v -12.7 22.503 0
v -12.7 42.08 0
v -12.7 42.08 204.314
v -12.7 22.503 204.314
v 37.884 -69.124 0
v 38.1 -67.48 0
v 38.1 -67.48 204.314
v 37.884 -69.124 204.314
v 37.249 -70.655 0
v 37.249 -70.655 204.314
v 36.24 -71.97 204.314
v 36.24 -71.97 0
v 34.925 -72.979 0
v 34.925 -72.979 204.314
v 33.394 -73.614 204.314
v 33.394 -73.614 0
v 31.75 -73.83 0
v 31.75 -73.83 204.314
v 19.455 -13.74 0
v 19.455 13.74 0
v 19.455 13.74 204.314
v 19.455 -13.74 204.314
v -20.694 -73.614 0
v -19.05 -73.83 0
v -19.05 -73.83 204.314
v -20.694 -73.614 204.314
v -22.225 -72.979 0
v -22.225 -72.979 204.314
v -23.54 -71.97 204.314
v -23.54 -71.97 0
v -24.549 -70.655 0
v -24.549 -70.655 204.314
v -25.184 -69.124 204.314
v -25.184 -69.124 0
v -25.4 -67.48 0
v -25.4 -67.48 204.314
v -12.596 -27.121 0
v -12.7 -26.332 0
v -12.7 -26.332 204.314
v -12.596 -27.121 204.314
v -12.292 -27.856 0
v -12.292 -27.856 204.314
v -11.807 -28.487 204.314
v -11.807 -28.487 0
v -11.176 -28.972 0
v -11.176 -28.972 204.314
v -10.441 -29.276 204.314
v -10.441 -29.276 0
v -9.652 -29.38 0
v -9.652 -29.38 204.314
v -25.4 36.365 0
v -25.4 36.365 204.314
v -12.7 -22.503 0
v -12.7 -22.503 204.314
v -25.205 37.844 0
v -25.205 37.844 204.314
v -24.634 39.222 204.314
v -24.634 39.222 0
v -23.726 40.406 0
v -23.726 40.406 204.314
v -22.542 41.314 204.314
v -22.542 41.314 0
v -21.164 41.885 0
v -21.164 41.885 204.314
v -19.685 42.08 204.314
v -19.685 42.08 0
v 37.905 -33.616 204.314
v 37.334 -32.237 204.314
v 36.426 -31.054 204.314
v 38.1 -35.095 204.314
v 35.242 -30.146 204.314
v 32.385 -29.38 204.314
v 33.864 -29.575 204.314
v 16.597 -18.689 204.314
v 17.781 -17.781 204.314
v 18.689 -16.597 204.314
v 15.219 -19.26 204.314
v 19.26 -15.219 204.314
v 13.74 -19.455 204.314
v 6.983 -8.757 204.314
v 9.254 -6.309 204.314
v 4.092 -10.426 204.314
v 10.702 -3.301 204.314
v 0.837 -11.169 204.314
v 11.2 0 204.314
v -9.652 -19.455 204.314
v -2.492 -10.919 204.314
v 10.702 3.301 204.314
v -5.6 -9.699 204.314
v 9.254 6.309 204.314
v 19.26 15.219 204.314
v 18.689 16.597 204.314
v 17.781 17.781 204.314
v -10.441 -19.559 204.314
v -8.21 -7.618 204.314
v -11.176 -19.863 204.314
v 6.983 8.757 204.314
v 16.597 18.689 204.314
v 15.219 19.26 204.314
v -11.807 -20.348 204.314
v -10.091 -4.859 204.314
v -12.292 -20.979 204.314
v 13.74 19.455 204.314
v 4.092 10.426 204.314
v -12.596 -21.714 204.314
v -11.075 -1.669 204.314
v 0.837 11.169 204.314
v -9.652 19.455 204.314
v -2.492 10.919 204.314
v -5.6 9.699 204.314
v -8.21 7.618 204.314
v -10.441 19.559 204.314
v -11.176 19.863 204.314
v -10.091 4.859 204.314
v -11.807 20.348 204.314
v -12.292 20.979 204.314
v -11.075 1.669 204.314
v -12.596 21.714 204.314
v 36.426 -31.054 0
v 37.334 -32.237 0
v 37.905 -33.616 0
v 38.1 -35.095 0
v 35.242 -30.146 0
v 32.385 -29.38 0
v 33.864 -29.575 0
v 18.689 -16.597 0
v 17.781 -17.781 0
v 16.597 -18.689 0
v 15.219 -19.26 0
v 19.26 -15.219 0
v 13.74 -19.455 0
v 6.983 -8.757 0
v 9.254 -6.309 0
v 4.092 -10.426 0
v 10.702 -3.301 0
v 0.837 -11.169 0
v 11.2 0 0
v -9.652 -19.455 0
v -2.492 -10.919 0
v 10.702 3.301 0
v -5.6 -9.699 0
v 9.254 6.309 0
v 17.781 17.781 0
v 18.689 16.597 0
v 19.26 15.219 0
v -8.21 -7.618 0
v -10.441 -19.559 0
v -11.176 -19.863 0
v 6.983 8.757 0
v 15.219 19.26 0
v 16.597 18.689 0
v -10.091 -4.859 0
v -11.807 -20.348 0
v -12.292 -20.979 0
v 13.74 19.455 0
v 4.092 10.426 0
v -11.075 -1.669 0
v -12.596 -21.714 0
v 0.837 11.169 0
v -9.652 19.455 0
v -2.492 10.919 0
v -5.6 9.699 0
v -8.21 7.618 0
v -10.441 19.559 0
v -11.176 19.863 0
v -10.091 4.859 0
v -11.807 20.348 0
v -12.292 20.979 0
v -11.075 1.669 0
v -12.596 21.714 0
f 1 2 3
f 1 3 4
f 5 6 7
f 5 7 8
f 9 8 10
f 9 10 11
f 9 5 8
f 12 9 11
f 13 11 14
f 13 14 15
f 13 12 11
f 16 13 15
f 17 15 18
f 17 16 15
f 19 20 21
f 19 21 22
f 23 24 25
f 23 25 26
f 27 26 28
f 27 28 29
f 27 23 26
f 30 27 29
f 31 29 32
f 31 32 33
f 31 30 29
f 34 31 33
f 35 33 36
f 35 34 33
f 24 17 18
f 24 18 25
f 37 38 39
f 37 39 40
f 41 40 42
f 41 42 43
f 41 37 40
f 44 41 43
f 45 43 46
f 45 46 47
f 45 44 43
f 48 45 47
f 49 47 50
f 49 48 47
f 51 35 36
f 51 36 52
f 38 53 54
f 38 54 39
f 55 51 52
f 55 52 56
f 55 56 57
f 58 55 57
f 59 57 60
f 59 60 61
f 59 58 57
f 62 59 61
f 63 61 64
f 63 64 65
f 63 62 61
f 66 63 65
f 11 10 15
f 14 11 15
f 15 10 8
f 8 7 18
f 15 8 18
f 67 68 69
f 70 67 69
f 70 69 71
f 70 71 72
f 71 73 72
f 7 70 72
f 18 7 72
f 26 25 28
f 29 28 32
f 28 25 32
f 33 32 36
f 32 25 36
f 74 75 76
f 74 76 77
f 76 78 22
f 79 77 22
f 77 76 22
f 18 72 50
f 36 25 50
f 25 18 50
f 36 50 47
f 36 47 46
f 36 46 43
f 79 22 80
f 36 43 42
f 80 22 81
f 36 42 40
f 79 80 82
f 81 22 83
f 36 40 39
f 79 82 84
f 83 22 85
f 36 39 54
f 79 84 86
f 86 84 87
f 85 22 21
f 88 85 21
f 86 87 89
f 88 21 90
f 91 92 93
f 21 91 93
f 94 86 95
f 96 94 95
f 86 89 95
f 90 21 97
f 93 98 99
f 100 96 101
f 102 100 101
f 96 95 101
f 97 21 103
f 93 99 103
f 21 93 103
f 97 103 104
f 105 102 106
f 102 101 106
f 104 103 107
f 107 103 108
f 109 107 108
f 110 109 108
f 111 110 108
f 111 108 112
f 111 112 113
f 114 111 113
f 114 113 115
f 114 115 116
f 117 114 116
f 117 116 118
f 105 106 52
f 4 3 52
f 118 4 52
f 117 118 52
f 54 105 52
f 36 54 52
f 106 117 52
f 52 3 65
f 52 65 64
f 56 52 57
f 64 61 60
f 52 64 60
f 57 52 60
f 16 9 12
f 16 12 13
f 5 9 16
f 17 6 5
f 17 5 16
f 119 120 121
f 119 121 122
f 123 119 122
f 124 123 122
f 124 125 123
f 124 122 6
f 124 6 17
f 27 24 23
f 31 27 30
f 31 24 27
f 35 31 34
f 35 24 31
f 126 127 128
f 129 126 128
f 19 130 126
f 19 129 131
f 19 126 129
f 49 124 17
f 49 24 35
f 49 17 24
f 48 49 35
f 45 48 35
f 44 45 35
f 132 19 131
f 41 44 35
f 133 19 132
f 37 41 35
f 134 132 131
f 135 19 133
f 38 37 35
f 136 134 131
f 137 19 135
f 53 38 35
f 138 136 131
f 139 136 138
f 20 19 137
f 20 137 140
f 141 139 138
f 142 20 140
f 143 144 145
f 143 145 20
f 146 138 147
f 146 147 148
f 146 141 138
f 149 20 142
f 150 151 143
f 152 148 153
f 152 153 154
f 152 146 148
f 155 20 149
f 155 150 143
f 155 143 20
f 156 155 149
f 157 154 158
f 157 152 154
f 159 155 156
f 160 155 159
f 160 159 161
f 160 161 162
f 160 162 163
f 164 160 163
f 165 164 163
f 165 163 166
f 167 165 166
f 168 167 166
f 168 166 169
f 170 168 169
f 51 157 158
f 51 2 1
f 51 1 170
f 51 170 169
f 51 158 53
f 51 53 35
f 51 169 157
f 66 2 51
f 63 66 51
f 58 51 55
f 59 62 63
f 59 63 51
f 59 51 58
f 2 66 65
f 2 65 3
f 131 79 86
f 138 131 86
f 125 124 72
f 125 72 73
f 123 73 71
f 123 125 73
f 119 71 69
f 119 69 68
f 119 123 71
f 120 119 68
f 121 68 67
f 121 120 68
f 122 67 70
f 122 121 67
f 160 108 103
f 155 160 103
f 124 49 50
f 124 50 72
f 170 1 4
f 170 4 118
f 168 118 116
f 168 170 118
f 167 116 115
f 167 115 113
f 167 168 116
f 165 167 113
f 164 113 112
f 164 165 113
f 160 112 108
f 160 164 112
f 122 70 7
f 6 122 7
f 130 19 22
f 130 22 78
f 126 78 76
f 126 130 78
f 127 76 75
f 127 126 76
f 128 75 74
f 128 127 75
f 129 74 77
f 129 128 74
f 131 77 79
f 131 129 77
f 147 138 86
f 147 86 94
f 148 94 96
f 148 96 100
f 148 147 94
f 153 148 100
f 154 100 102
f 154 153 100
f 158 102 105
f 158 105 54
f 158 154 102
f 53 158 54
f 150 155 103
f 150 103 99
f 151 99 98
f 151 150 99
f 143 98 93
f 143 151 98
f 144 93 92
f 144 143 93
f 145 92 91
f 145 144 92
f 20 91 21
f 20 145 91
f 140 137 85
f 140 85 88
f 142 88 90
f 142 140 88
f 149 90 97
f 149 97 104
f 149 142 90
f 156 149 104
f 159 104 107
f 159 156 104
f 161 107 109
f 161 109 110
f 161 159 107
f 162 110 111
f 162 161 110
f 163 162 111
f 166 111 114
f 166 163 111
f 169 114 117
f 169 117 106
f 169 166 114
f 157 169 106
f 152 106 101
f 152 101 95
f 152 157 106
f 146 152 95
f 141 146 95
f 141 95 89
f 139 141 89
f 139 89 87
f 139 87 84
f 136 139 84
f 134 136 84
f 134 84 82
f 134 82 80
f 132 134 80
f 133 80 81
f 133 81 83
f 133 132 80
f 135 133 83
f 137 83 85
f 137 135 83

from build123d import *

# Parameters (mm, degrees)
SKETCH1_R           = 11.2
BOSS_EXTRUDE1_DEPTH = 204.313708212
CUT_EXTRUDE1_DEPTH  = 236.982


with BuildPart() as part:
    # Sketch1 → Boss-Extrude1 (new body)
    with BuildSketch(Plane.XY):
        with BuildLine():
            Line((-25.4, -67.479999962), (-25.4, 36.365))
            ThreePointArc((-25.4, 36.365), (-23.726115254, 40.406115254), (-19.685, 42.08))
            Line((-19.685, 42.08), (32.385, 42.08))
            ThreePointArc((32.385, 42.08), (36.426115254, 40.406115254), (38.1, 36.365))
            Line((38.1, 36.365), (38.1, 35.095))
            ThreePointArc((38.1, 35.095), (36.426115254, 31.053884746), (32.385, 29.38))
            Line((32.385, 29.38), (-9.652, 29.38))
            ThreePointArc((-9.652, 29.38), (-11.807261469, 28.487261469), (-12.7, 26.332))
            Line((-12.7, 26.332), (-12.7, 22.503))
            ThreePointArc((-12.7, 22.503), (-11.807261469, 20.347738531), (-9.652, 19.455))
            Line((-9.652, 19.455), (0, 19.455))
            Line((0, 19.455), (13.74, 19.455))
            ThreePointArc((13.74, 19.455), (17.781115254, 17.781115254), (19.455, 13.74))
            Line((19.455, 13.74), (19.455, 0))
            Line((19.455, 0), (19.455, -13.74))
            ThreePointArc((19.455, -13.74), (17.781115254, -17.781115254), (13.74, -19.455))
            Line((13.74, -19.455), (0, -19.455))
            Line((0, -19.455), (-9.652, -19.455))
            ThreePointArc((-9.652, -19.455), (-11.807261469, -20.347738531), (-12.7, -22.503))
            Line((-12.7, -22.503), (-12.7, -26.331999962))
            ThreePointArc((-12.7, -26.331999962), (-11.807261469, -28.487261431), (-9.652, -29.379999962))
            Line((-9.652, -29.379999962), (32.385, -29.379999962))
            ThreePointArc((32.385, -29.379999962), (36.426115254, -31.053884708), (38.1, -35.094999962))
            Line((38.1, -35.094999962), (38.1, -67.479999962))
            ThreePointArc((38.1, -67.479999962), (36.240128061, -71.970128023), (31.75, -73.829999962))
            Line((31.75, -73.829999962), (-19.05, -73.829999962))
            ThreePointArc((-19.05, -73.829999962), (-23.540128061, -71.970128023), (-25.4, -67.479999962))
        make_face()
        Circle(SKETCH1_R, mode=Mode.SUBTRACT)
    extrude(amount=BOSS_EXTRUDE1_DEPTH)

    # Sketch2 → Cut-Extrude1 (cut)
    with BuildSketch(Plane.XY.offset(204.313708212)):
        with BuildLine():
            ThreePointArc((32.385, 29.38), (36.426115254, 31.053884746), (38.1, 35.095))
            Line((38.1, 35.095), (38.1, 36.365))
            ThreePointArc((38.1, 36.365), (36.426115254, 40.406115254), (32.385, 42.08))
            Line((32.385, 42.08), (19.455, 42.08))
            Line((19.455, 42.08), (19.455, 29.38))
            Line((19.455, 29.38), (32.385, 29.38))
        make_face()
        with BuildLine():
            Line((-9.652, 29.38), (19.455, 29.38))
            Line((19.455, 29.38), (19.455, 42.08))
            Line((19.455, 42.08), (-12.7, 42.08))
            Line((-12.7, 42.08), (-12.7, 26.332))
            ThreePointArc((-12.7, 26.332), (-11.807261469, 28.487261469), (-9.652, 29.38))
        make_face()
        with BuildLine():
            Line((19.455, 13.74), (19.455, -13.74))
            Line((19.455, -13.74), (38.1, -13.74))
            Line((38.1, -13.74), (38.1, 35.095))
            ThreePointArc((38.1, 35.095), (36.426115254, 31.053884746), (32.385, 29.38))
            Line((32.385, 29.38), (19.455, 29.38))
            Line((19.455, 29.38), (19.455, 22.503))
            Line((19.455, 22.503), (19.455, 13.74))
        make_face()
        with BuildLine():
            ThreePointArc((32.385, 42.08), (36.426115254, 40.406115254), (38.1, 36.365))
            Line((38.1, 36.365), (38.1, 42.08))
            Line((38.1, 42.08), (32.385, 42.08))
        make_face()
        with BuildLine():
            Line((-12.7, 22.503), (19.455, 22.503))
            Line((19.455, 22.503), (19.455, 29.38))
            Line((19.455, 29.38), (-9.652, 29.38))
            ThreePointArc((-9.652, 29.38), (-11.807261469, 28.487261469), (-12.7, 26.332))
            Line((-12.7, 26.332), (-12.7, 22.503))
        make_face()
    extrude(amount=-CUT_EXTRUDE1_DEPTH, mode=Mode.SUBTRACT)


solid = part.part
